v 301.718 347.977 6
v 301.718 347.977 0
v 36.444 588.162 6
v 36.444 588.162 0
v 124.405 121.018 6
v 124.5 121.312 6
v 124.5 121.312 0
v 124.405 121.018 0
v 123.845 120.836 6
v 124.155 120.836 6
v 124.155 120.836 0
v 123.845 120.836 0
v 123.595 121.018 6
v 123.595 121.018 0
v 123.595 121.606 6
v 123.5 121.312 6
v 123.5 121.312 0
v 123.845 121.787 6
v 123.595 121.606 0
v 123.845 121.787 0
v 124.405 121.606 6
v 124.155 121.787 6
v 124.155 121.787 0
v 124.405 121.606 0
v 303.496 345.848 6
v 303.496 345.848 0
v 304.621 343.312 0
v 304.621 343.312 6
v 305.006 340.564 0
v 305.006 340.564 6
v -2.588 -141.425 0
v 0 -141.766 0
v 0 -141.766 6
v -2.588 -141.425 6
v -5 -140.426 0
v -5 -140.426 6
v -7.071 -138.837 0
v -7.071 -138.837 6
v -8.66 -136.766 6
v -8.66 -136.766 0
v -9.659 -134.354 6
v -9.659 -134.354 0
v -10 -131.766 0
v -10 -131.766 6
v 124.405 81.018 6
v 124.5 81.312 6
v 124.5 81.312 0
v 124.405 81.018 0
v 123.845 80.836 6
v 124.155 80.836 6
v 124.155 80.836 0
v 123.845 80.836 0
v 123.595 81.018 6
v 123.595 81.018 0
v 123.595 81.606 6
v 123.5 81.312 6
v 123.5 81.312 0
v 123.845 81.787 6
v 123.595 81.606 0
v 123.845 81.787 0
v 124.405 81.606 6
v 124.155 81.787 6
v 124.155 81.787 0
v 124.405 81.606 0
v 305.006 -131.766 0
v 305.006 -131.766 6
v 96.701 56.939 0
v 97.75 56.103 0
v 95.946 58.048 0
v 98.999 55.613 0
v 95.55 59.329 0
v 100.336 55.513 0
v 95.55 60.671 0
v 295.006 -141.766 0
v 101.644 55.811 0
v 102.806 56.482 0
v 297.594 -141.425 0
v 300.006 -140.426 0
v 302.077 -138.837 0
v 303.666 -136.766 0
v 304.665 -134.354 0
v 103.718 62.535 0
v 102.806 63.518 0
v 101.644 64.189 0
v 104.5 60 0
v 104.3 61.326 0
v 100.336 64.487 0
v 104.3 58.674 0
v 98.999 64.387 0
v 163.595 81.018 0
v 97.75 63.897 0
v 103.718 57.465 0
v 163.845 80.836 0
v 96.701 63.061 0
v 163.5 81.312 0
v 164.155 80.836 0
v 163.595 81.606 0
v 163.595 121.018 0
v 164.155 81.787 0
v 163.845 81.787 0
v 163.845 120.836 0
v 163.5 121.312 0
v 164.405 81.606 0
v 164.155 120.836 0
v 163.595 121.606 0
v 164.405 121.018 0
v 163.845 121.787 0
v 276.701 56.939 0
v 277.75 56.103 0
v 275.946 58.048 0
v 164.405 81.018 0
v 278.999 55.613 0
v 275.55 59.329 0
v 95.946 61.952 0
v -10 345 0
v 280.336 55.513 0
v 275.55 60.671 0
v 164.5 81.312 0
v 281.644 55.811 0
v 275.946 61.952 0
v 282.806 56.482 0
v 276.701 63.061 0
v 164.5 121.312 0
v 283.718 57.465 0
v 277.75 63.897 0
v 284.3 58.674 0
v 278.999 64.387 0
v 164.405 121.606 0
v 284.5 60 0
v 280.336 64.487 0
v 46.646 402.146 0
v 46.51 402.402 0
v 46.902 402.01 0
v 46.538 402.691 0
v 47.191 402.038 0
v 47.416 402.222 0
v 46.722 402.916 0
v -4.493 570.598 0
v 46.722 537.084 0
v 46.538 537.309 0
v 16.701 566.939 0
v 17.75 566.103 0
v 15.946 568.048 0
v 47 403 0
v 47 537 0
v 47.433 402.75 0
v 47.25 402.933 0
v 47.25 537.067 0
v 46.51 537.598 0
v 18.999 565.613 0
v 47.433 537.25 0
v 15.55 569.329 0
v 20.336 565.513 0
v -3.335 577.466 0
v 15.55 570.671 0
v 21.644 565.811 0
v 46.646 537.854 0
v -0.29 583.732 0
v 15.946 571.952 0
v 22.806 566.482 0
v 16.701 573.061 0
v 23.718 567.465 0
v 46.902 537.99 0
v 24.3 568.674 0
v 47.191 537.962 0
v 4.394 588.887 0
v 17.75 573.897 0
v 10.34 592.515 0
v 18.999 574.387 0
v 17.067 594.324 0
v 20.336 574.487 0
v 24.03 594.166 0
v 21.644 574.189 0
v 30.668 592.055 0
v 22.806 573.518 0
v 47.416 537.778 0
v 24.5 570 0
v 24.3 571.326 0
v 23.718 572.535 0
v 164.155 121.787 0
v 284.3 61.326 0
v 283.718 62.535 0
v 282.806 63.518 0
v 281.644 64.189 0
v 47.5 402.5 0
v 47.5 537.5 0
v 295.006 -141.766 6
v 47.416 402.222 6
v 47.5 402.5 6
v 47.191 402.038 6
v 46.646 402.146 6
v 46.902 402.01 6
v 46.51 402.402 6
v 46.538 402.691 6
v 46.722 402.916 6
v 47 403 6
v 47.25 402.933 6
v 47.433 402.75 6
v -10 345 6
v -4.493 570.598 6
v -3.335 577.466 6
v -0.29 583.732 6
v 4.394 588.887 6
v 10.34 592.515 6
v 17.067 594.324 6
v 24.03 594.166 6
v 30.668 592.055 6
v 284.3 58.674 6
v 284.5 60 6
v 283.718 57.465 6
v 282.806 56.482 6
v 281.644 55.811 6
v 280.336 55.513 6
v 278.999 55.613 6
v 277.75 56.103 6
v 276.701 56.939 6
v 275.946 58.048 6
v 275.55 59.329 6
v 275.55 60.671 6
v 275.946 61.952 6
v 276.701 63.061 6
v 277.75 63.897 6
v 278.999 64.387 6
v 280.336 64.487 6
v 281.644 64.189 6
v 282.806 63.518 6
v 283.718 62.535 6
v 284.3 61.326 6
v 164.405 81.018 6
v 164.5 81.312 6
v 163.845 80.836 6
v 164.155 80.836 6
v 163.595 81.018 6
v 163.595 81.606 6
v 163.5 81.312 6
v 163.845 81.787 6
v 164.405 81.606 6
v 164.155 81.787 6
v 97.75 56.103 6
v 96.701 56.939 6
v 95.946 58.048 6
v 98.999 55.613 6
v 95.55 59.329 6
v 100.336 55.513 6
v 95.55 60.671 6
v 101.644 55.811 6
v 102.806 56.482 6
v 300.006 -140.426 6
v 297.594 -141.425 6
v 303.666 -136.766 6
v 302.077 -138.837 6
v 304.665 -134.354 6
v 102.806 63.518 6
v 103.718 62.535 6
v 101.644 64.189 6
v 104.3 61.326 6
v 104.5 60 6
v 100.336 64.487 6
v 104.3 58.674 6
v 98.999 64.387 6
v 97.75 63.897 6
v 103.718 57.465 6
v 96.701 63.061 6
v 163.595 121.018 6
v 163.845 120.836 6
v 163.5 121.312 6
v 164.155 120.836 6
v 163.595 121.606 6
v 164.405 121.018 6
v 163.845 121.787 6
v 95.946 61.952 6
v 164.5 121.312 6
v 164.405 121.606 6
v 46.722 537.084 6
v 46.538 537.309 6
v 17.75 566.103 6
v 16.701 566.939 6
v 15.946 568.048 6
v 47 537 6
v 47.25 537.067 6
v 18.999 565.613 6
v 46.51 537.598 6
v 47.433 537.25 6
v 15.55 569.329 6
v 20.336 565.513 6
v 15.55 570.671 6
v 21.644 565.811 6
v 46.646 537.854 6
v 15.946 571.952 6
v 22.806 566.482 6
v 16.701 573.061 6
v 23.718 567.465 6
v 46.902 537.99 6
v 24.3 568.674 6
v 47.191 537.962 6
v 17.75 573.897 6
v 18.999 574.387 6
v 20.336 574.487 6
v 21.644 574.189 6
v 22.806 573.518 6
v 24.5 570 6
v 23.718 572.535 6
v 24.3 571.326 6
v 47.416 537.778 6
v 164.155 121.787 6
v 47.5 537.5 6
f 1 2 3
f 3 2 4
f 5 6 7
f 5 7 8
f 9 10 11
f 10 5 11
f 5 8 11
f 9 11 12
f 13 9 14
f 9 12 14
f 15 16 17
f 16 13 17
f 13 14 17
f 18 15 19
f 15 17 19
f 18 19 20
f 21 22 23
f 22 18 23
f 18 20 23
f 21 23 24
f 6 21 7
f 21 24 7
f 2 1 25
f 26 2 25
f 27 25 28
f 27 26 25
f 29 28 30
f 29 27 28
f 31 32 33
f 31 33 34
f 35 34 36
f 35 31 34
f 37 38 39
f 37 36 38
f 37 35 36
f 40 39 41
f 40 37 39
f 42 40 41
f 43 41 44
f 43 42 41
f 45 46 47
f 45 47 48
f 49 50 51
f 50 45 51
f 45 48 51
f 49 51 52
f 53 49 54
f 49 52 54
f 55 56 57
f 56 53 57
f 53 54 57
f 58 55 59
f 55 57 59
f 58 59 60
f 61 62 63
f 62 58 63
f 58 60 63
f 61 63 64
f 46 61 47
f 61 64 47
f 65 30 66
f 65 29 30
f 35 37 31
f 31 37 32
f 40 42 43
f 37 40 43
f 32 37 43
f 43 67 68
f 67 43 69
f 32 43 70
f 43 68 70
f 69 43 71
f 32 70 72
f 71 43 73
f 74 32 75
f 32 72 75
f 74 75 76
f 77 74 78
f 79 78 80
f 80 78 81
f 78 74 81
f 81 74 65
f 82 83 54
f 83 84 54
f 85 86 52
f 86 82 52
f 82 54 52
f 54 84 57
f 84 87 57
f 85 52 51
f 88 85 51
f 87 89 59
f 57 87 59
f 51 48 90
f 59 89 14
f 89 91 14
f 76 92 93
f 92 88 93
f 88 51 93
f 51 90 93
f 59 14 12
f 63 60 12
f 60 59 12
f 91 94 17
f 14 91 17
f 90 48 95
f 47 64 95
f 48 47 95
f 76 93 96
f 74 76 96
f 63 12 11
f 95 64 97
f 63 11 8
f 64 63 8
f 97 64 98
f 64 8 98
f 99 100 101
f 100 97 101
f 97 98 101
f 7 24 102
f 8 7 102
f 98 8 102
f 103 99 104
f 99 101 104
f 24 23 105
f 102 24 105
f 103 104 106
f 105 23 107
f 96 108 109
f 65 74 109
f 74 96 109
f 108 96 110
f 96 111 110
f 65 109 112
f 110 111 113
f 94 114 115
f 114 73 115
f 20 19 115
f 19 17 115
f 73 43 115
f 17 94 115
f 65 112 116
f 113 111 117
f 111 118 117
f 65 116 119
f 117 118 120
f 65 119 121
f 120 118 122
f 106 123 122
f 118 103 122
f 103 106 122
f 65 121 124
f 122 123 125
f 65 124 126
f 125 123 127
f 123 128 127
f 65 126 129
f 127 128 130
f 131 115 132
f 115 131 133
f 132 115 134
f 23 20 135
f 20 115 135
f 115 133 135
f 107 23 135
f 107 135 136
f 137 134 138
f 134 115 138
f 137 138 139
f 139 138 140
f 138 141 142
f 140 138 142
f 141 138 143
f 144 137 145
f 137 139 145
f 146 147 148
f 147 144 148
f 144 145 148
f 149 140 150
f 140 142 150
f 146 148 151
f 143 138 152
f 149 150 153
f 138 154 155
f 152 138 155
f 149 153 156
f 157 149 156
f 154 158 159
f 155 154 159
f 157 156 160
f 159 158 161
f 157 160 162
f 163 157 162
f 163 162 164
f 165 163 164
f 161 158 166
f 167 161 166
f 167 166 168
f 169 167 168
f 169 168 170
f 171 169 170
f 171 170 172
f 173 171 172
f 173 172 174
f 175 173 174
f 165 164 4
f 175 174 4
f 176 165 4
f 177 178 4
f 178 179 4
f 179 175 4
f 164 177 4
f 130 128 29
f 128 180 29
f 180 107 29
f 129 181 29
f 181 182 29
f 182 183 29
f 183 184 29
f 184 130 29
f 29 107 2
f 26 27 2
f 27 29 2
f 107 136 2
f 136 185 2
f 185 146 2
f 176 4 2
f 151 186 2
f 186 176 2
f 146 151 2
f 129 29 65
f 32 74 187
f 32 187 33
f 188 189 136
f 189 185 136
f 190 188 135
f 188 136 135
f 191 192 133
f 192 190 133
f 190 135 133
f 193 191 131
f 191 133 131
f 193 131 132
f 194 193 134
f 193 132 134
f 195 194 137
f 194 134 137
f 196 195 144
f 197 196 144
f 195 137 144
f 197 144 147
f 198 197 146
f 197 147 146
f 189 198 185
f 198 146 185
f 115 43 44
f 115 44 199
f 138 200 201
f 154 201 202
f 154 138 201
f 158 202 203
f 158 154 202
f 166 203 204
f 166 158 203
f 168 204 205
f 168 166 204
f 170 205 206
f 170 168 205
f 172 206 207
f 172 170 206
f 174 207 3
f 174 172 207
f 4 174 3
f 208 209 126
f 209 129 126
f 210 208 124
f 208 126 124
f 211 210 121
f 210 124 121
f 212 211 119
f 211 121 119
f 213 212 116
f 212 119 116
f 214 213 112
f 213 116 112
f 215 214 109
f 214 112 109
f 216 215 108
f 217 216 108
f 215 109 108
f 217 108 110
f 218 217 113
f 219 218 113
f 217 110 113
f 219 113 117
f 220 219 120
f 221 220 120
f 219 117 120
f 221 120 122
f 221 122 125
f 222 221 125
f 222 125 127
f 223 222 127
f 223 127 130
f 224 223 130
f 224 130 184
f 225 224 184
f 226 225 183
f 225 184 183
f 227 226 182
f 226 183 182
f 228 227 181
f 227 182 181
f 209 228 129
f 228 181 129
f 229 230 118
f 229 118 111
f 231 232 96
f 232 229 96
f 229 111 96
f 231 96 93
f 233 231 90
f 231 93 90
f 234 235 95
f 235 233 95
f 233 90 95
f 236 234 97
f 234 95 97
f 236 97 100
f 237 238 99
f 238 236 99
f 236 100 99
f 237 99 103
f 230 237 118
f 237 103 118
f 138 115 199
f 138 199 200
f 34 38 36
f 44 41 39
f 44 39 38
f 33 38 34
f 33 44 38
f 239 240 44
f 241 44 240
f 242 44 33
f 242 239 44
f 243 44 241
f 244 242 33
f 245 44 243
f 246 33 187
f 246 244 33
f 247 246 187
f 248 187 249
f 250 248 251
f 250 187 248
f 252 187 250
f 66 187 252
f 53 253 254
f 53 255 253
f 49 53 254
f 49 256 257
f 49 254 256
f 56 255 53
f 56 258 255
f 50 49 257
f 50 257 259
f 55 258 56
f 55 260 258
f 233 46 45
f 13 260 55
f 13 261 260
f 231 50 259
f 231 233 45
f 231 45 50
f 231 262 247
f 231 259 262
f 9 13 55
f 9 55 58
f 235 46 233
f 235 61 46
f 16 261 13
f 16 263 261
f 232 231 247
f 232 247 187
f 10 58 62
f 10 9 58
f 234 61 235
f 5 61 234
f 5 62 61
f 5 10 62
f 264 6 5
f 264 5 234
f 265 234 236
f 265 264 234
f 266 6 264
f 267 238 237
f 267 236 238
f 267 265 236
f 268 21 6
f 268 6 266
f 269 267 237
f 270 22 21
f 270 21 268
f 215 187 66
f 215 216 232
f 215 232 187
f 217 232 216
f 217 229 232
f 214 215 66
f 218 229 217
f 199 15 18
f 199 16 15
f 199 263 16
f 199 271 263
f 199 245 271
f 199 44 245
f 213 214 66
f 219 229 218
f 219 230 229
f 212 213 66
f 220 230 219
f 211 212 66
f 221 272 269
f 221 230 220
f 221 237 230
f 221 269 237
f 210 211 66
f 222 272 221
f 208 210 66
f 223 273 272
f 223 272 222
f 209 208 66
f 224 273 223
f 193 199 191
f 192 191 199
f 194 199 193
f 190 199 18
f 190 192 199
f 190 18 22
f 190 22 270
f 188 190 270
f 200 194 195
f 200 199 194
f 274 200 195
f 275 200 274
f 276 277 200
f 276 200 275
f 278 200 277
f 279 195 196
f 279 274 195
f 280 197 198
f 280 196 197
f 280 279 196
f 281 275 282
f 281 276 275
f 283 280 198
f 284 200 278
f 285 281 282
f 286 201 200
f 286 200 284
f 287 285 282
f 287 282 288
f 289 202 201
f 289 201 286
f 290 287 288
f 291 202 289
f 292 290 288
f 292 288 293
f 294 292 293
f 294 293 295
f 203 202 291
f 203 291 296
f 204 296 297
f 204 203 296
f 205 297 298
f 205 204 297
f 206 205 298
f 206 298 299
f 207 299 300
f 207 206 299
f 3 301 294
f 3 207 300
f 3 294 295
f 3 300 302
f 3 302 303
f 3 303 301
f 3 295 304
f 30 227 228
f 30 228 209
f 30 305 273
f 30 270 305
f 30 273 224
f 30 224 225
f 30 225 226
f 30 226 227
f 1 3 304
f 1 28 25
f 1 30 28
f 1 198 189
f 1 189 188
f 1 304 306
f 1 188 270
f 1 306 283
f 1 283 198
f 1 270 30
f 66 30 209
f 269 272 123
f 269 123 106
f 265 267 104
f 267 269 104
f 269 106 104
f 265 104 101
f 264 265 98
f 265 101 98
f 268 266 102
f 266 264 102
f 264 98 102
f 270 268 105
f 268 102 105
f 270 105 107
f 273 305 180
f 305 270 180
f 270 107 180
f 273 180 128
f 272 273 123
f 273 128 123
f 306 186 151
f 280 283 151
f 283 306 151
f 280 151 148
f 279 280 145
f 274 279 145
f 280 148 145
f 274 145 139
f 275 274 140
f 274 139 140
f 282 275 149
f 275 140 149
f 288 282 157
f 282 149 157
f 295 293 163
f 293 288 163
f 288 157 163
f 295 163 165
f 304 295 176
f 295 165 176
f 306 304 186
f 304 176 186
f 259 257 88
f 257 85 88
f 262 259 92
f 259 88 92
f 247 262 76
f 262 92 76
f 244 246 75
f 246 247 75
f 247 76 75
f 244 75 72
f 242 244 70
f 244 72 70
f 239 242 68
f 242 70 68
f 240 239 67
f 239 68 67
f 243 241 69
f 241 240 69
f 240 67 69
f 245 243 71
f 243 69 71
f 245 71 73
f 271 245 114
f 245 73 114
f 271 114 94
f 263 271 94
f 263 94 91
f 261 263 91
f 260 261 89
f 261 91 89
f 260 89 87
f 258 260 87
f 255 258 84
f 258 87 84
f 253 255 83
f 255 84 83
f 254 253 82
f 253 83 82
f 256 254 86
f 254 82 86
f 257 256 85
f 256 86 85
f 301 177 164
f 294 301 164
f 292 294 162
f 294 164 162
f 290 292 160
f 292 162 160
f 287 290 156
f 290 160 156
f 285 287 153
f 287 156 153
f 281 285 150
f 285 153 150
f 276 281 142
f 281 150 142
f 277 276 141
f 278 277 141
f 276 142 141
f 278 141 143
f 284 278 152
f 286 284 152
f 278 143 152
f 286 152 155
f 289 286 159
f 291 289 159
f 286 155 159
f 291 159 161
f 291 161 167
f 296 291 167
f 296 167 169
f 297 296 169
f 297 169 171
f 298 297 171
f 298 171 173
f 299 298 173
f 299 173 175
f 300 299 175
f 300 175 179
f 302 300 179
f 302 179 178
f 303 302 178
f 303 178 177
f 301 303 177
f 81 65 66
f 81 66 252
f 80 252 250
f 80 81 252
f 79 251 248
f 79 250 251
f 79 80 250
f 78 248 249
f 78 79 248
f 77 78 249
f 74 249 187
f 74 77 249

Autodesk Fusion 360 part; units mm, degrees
sketch "Sketch1" plane through (0, 0, 0) normal (0, 0, 1) x (1, 0, 0)
  line L0 (0, 0) -> (300, 0)
  line L1 (300, 0) -> (300, 335)
  line L2 (300, 335) -> (0, 335)
  line L3 (0, 335) -> (0, 0)
  line L4 (0, 0) -> (100, 0)
  line L5 (100, 0) -> (100, 60)
  line L6 (100, 60) -> (0, 60)
  line L7 (0, 60) -> (0, 0)
  line L8 (300, 0) -> (280, 0)
  line L9 (280, 0) -> (280, 60)
  line L10 (280, 60) -> (300, 60)
  line L11 (300, 60) -> (300, 0)
  line L12 (0, 335) -> (300, 335)
  line L13 (300, 335) -> (300, 670)
  line L14 (300, 670) -> (0, 670)
  line L15 (0, 670) -> (0, 335)
  line L16 (0, 670) -> (20, 670)
  line L17 (20, 670) -> (20, 570)
  line L18 (20, 570) -> (0, 570)
  line L19 (0, 570) -> (0, 670)
  circle A0 centre (20, 570) radius 4.5
  circle A1 centre (280, 60) radius 4.5
  circle A2 centre (100, 60) radius 4.5
  line L20 (20, 570) -> (20, 530)
  line L21 (20, 530) -> (74, 530)
  line L22 (74, 530) -> (74, 410)
  line L23 (74, 410) -> (20, 410)
  line L24 (20, 410) -> (20, 530)
  line L25 (0, 335) -> (124, 335)
  line L26 (124, 335) -> (124, 121.3118)
  line L27 (124, 121.3118) -> (0, 121.3118)
  line L28 (0, 121.3118) -> (0, 335)
  circle A3 centre (124, 121.3118) radius 0.5
  line L29 (124, 121.3118) -> (164, 121.3118)
  line L30 (164, 121.3118) -> (164, 81.3118)
  line L31 (164, 81.3118) -> (124, 81.3118)
  line L32 (124, 81.3118) -> (124, 121.3118)
  circle A4 centre (164, 121.3118) radius 0.5
  circle A5 centre (164, 81.3118) radius 0.5
  circle A6 centre (124, 81.3118) radius 0.5
  line L33 (47, 530) -> (47, 537.5)
  circle A7 centre (47, 537.5) radius 0.5
  line L34 (47, 410) -> (47, 402.5)
  circle A8 centre (47, 402.5) radius 0.5
  line L35 (0, 335) -> (295.006, 335)
  line L36 (295.006, 335) -> (295.006, -131.766)
  line L37 (295.006, -131.766) -> (0, -131.766)
  line L38 (0, -131.766) -> (0, 335)
  line L39 (-10, 345) -> (305.006, 345)
  line L40 (305.006, 340.5643) -> (305.006, -131.766)
  line L41 (295.006, -141.766) -> (0, -141.766)
  line L42 (-10, -131.766) -> (-10, 345)
  circle A9 centre (20, 570) radius 24.5
  circle A10 centre (100, 60) radius 24.5
  circle A11 centre (280, 60) radius 24.5
  line L43 (301.7178, 347.9772) -> (36.444, 588.1617)
  line L44 (-10, 345) -> (-4.4927, 570.5979)
  arc A12 (-10, -131.766) -> (0, -141.766) centre (0, -131.766) ccw
  arc A13 (295.006, -141.766) -> (305.006, -131.766) centre (295.006, -131.766) ccw
  arc A14 (305.006, 340.5643) -> (301.7178, 347.9772) centre (295.006, 340.5643) ccw
  dimension "d1" = 300
  dimension "d2" = 335
  dimension "d3" = 100
  dimension "d4" = 60
  dimension "d5" = 20
  dimension "d6" = 60
  dimension "d7" = 300
  dimension "d8" = 335
  dimension "d9" = 20
  dimension "d10" = 100
  dimension "d11" = 9
  dimension "d12" = 9
  dimension "d13" = 9
  dimension "d14" = 40
  dimension "d15" = 54
  dimension "d16" = 120
  dimension "d17" = 124
  dimension "d18" = 213.6882
  dimension "d19" = 1
  dimension "d20" = 40
  dimension "d21" = 40
  dimension "d22" = 1
  dimension "d23" = 1
  dimension "d24" = 1
  dimension "d25" = 7.5
  dimension "d26" = 1
  dimension "d27" = 7.5
  dimension "d28" = 1
  dimension "d29" = 295.006
  dimension "d30" = 466.766
  dimension "d32" = 20
  dimension "d33" = 20
  dimension "d34" = 20
  dimension "d35" = 10
  dimension "d36" = 10
extrude "Extrude1" add sketch "Sketch1" along normal blind 6 contours L0 L3 L4 L5 L6 L7 L38 A10 | L0 L1 L3 L7 L8 L11 L13 L15 L28 L36 L37 L38 L39 L40 L41 L42 A11 A12 A13 A14 | L0 L4 L8 L36 L37 L38 | L0 L2 L3 L5 L6 L9 L12 L26 L27 A3 L29 L30 L31 L32 A4 A5 A6 L35 L36 L38 A10 A11 | L0 L8 L9 L36 A11 | L5 L6 A2 A10 | L5 L6 A2 A10 | L2 L3 L12 L25 L26 L27 L28 A3 L35 L38 | L0 L1 L8 L11 L36 A11 | L9 L10 A1 L36 A11 | L9 L10 A1 L36 A11 | L2 L12 L13 L15 L25 L35 L39 | L1 L10 L11 L36 A11 | L1 L10 L36 A11 | L1 L2 L12 L36 A11 | L15 L39 A9 L44 | L21 L22 L23 L24 | L13 L15 L39 A9 L43 | A3 L29 L30 L31 L32 A4 A5 A6 | L1 L11 A11 | L15 L19 A9 | L15 L18 A0 L20 A9 | L13 L39 L43 A14 | L15 L17 L18 L19 A0 A9 | L17 A0 L20 A9
sketch "FaceSketch" plane through (0, 0, 6) normal (0, 0, 1) x (-1, 0, 0)
  circle A0 centre (-124, -81.3118) radius 0.5
  circle A1 centre (-164, -121.3118) radius 0.5
  circle A2 centre (-280, -60) radius 4.5
  circle A3 centre (-20, -570) radius 4.5
  circle A4 centre (-47, -402.5) radius 0.5
  circle A5 centre (-124, -121.3118) radius 0.5
  circle A6 centre (-47, -537.5) radius 0.5
  circle A7 centre (-100, -60) radius 4.5
  circle A8 centre (-164, -81.3118) radius 0.5
  arc A9 (-295.006, 141.766) -> (-305.006, 131.766) centre (-295.006, 131.766) ccw
  line L0 (-305.006, 131.766) -> (-305.006, -340.5643)
  arc A10 (-305.006, -340.5643) -> (-301.7178, -347.9772) centre (-295.006, -340.5643) ccw
  line L1 (-301.7178, -347.9772) -> (-36.444, -588.1617)
  arc A11 (-36.444, -588.1617) -> (4.4927, -570.5979) centre (-20, -570) ccw
  line L2 (4.4927, -570.5979) -> (10, -345)
  line L3 (10, -345) -> (10, 131.766)
  arc A12 (10, 131.766) -> (0, 141.766) centre (0, 131.766) ccw
  line L4 (0, 141.766) -> (-295.006, 141.766)
equation "d19 = d26"
equation "d22 = d19"
equation "d23 = d19"
equation "d24 = d19"
equation "d28 = d26"
